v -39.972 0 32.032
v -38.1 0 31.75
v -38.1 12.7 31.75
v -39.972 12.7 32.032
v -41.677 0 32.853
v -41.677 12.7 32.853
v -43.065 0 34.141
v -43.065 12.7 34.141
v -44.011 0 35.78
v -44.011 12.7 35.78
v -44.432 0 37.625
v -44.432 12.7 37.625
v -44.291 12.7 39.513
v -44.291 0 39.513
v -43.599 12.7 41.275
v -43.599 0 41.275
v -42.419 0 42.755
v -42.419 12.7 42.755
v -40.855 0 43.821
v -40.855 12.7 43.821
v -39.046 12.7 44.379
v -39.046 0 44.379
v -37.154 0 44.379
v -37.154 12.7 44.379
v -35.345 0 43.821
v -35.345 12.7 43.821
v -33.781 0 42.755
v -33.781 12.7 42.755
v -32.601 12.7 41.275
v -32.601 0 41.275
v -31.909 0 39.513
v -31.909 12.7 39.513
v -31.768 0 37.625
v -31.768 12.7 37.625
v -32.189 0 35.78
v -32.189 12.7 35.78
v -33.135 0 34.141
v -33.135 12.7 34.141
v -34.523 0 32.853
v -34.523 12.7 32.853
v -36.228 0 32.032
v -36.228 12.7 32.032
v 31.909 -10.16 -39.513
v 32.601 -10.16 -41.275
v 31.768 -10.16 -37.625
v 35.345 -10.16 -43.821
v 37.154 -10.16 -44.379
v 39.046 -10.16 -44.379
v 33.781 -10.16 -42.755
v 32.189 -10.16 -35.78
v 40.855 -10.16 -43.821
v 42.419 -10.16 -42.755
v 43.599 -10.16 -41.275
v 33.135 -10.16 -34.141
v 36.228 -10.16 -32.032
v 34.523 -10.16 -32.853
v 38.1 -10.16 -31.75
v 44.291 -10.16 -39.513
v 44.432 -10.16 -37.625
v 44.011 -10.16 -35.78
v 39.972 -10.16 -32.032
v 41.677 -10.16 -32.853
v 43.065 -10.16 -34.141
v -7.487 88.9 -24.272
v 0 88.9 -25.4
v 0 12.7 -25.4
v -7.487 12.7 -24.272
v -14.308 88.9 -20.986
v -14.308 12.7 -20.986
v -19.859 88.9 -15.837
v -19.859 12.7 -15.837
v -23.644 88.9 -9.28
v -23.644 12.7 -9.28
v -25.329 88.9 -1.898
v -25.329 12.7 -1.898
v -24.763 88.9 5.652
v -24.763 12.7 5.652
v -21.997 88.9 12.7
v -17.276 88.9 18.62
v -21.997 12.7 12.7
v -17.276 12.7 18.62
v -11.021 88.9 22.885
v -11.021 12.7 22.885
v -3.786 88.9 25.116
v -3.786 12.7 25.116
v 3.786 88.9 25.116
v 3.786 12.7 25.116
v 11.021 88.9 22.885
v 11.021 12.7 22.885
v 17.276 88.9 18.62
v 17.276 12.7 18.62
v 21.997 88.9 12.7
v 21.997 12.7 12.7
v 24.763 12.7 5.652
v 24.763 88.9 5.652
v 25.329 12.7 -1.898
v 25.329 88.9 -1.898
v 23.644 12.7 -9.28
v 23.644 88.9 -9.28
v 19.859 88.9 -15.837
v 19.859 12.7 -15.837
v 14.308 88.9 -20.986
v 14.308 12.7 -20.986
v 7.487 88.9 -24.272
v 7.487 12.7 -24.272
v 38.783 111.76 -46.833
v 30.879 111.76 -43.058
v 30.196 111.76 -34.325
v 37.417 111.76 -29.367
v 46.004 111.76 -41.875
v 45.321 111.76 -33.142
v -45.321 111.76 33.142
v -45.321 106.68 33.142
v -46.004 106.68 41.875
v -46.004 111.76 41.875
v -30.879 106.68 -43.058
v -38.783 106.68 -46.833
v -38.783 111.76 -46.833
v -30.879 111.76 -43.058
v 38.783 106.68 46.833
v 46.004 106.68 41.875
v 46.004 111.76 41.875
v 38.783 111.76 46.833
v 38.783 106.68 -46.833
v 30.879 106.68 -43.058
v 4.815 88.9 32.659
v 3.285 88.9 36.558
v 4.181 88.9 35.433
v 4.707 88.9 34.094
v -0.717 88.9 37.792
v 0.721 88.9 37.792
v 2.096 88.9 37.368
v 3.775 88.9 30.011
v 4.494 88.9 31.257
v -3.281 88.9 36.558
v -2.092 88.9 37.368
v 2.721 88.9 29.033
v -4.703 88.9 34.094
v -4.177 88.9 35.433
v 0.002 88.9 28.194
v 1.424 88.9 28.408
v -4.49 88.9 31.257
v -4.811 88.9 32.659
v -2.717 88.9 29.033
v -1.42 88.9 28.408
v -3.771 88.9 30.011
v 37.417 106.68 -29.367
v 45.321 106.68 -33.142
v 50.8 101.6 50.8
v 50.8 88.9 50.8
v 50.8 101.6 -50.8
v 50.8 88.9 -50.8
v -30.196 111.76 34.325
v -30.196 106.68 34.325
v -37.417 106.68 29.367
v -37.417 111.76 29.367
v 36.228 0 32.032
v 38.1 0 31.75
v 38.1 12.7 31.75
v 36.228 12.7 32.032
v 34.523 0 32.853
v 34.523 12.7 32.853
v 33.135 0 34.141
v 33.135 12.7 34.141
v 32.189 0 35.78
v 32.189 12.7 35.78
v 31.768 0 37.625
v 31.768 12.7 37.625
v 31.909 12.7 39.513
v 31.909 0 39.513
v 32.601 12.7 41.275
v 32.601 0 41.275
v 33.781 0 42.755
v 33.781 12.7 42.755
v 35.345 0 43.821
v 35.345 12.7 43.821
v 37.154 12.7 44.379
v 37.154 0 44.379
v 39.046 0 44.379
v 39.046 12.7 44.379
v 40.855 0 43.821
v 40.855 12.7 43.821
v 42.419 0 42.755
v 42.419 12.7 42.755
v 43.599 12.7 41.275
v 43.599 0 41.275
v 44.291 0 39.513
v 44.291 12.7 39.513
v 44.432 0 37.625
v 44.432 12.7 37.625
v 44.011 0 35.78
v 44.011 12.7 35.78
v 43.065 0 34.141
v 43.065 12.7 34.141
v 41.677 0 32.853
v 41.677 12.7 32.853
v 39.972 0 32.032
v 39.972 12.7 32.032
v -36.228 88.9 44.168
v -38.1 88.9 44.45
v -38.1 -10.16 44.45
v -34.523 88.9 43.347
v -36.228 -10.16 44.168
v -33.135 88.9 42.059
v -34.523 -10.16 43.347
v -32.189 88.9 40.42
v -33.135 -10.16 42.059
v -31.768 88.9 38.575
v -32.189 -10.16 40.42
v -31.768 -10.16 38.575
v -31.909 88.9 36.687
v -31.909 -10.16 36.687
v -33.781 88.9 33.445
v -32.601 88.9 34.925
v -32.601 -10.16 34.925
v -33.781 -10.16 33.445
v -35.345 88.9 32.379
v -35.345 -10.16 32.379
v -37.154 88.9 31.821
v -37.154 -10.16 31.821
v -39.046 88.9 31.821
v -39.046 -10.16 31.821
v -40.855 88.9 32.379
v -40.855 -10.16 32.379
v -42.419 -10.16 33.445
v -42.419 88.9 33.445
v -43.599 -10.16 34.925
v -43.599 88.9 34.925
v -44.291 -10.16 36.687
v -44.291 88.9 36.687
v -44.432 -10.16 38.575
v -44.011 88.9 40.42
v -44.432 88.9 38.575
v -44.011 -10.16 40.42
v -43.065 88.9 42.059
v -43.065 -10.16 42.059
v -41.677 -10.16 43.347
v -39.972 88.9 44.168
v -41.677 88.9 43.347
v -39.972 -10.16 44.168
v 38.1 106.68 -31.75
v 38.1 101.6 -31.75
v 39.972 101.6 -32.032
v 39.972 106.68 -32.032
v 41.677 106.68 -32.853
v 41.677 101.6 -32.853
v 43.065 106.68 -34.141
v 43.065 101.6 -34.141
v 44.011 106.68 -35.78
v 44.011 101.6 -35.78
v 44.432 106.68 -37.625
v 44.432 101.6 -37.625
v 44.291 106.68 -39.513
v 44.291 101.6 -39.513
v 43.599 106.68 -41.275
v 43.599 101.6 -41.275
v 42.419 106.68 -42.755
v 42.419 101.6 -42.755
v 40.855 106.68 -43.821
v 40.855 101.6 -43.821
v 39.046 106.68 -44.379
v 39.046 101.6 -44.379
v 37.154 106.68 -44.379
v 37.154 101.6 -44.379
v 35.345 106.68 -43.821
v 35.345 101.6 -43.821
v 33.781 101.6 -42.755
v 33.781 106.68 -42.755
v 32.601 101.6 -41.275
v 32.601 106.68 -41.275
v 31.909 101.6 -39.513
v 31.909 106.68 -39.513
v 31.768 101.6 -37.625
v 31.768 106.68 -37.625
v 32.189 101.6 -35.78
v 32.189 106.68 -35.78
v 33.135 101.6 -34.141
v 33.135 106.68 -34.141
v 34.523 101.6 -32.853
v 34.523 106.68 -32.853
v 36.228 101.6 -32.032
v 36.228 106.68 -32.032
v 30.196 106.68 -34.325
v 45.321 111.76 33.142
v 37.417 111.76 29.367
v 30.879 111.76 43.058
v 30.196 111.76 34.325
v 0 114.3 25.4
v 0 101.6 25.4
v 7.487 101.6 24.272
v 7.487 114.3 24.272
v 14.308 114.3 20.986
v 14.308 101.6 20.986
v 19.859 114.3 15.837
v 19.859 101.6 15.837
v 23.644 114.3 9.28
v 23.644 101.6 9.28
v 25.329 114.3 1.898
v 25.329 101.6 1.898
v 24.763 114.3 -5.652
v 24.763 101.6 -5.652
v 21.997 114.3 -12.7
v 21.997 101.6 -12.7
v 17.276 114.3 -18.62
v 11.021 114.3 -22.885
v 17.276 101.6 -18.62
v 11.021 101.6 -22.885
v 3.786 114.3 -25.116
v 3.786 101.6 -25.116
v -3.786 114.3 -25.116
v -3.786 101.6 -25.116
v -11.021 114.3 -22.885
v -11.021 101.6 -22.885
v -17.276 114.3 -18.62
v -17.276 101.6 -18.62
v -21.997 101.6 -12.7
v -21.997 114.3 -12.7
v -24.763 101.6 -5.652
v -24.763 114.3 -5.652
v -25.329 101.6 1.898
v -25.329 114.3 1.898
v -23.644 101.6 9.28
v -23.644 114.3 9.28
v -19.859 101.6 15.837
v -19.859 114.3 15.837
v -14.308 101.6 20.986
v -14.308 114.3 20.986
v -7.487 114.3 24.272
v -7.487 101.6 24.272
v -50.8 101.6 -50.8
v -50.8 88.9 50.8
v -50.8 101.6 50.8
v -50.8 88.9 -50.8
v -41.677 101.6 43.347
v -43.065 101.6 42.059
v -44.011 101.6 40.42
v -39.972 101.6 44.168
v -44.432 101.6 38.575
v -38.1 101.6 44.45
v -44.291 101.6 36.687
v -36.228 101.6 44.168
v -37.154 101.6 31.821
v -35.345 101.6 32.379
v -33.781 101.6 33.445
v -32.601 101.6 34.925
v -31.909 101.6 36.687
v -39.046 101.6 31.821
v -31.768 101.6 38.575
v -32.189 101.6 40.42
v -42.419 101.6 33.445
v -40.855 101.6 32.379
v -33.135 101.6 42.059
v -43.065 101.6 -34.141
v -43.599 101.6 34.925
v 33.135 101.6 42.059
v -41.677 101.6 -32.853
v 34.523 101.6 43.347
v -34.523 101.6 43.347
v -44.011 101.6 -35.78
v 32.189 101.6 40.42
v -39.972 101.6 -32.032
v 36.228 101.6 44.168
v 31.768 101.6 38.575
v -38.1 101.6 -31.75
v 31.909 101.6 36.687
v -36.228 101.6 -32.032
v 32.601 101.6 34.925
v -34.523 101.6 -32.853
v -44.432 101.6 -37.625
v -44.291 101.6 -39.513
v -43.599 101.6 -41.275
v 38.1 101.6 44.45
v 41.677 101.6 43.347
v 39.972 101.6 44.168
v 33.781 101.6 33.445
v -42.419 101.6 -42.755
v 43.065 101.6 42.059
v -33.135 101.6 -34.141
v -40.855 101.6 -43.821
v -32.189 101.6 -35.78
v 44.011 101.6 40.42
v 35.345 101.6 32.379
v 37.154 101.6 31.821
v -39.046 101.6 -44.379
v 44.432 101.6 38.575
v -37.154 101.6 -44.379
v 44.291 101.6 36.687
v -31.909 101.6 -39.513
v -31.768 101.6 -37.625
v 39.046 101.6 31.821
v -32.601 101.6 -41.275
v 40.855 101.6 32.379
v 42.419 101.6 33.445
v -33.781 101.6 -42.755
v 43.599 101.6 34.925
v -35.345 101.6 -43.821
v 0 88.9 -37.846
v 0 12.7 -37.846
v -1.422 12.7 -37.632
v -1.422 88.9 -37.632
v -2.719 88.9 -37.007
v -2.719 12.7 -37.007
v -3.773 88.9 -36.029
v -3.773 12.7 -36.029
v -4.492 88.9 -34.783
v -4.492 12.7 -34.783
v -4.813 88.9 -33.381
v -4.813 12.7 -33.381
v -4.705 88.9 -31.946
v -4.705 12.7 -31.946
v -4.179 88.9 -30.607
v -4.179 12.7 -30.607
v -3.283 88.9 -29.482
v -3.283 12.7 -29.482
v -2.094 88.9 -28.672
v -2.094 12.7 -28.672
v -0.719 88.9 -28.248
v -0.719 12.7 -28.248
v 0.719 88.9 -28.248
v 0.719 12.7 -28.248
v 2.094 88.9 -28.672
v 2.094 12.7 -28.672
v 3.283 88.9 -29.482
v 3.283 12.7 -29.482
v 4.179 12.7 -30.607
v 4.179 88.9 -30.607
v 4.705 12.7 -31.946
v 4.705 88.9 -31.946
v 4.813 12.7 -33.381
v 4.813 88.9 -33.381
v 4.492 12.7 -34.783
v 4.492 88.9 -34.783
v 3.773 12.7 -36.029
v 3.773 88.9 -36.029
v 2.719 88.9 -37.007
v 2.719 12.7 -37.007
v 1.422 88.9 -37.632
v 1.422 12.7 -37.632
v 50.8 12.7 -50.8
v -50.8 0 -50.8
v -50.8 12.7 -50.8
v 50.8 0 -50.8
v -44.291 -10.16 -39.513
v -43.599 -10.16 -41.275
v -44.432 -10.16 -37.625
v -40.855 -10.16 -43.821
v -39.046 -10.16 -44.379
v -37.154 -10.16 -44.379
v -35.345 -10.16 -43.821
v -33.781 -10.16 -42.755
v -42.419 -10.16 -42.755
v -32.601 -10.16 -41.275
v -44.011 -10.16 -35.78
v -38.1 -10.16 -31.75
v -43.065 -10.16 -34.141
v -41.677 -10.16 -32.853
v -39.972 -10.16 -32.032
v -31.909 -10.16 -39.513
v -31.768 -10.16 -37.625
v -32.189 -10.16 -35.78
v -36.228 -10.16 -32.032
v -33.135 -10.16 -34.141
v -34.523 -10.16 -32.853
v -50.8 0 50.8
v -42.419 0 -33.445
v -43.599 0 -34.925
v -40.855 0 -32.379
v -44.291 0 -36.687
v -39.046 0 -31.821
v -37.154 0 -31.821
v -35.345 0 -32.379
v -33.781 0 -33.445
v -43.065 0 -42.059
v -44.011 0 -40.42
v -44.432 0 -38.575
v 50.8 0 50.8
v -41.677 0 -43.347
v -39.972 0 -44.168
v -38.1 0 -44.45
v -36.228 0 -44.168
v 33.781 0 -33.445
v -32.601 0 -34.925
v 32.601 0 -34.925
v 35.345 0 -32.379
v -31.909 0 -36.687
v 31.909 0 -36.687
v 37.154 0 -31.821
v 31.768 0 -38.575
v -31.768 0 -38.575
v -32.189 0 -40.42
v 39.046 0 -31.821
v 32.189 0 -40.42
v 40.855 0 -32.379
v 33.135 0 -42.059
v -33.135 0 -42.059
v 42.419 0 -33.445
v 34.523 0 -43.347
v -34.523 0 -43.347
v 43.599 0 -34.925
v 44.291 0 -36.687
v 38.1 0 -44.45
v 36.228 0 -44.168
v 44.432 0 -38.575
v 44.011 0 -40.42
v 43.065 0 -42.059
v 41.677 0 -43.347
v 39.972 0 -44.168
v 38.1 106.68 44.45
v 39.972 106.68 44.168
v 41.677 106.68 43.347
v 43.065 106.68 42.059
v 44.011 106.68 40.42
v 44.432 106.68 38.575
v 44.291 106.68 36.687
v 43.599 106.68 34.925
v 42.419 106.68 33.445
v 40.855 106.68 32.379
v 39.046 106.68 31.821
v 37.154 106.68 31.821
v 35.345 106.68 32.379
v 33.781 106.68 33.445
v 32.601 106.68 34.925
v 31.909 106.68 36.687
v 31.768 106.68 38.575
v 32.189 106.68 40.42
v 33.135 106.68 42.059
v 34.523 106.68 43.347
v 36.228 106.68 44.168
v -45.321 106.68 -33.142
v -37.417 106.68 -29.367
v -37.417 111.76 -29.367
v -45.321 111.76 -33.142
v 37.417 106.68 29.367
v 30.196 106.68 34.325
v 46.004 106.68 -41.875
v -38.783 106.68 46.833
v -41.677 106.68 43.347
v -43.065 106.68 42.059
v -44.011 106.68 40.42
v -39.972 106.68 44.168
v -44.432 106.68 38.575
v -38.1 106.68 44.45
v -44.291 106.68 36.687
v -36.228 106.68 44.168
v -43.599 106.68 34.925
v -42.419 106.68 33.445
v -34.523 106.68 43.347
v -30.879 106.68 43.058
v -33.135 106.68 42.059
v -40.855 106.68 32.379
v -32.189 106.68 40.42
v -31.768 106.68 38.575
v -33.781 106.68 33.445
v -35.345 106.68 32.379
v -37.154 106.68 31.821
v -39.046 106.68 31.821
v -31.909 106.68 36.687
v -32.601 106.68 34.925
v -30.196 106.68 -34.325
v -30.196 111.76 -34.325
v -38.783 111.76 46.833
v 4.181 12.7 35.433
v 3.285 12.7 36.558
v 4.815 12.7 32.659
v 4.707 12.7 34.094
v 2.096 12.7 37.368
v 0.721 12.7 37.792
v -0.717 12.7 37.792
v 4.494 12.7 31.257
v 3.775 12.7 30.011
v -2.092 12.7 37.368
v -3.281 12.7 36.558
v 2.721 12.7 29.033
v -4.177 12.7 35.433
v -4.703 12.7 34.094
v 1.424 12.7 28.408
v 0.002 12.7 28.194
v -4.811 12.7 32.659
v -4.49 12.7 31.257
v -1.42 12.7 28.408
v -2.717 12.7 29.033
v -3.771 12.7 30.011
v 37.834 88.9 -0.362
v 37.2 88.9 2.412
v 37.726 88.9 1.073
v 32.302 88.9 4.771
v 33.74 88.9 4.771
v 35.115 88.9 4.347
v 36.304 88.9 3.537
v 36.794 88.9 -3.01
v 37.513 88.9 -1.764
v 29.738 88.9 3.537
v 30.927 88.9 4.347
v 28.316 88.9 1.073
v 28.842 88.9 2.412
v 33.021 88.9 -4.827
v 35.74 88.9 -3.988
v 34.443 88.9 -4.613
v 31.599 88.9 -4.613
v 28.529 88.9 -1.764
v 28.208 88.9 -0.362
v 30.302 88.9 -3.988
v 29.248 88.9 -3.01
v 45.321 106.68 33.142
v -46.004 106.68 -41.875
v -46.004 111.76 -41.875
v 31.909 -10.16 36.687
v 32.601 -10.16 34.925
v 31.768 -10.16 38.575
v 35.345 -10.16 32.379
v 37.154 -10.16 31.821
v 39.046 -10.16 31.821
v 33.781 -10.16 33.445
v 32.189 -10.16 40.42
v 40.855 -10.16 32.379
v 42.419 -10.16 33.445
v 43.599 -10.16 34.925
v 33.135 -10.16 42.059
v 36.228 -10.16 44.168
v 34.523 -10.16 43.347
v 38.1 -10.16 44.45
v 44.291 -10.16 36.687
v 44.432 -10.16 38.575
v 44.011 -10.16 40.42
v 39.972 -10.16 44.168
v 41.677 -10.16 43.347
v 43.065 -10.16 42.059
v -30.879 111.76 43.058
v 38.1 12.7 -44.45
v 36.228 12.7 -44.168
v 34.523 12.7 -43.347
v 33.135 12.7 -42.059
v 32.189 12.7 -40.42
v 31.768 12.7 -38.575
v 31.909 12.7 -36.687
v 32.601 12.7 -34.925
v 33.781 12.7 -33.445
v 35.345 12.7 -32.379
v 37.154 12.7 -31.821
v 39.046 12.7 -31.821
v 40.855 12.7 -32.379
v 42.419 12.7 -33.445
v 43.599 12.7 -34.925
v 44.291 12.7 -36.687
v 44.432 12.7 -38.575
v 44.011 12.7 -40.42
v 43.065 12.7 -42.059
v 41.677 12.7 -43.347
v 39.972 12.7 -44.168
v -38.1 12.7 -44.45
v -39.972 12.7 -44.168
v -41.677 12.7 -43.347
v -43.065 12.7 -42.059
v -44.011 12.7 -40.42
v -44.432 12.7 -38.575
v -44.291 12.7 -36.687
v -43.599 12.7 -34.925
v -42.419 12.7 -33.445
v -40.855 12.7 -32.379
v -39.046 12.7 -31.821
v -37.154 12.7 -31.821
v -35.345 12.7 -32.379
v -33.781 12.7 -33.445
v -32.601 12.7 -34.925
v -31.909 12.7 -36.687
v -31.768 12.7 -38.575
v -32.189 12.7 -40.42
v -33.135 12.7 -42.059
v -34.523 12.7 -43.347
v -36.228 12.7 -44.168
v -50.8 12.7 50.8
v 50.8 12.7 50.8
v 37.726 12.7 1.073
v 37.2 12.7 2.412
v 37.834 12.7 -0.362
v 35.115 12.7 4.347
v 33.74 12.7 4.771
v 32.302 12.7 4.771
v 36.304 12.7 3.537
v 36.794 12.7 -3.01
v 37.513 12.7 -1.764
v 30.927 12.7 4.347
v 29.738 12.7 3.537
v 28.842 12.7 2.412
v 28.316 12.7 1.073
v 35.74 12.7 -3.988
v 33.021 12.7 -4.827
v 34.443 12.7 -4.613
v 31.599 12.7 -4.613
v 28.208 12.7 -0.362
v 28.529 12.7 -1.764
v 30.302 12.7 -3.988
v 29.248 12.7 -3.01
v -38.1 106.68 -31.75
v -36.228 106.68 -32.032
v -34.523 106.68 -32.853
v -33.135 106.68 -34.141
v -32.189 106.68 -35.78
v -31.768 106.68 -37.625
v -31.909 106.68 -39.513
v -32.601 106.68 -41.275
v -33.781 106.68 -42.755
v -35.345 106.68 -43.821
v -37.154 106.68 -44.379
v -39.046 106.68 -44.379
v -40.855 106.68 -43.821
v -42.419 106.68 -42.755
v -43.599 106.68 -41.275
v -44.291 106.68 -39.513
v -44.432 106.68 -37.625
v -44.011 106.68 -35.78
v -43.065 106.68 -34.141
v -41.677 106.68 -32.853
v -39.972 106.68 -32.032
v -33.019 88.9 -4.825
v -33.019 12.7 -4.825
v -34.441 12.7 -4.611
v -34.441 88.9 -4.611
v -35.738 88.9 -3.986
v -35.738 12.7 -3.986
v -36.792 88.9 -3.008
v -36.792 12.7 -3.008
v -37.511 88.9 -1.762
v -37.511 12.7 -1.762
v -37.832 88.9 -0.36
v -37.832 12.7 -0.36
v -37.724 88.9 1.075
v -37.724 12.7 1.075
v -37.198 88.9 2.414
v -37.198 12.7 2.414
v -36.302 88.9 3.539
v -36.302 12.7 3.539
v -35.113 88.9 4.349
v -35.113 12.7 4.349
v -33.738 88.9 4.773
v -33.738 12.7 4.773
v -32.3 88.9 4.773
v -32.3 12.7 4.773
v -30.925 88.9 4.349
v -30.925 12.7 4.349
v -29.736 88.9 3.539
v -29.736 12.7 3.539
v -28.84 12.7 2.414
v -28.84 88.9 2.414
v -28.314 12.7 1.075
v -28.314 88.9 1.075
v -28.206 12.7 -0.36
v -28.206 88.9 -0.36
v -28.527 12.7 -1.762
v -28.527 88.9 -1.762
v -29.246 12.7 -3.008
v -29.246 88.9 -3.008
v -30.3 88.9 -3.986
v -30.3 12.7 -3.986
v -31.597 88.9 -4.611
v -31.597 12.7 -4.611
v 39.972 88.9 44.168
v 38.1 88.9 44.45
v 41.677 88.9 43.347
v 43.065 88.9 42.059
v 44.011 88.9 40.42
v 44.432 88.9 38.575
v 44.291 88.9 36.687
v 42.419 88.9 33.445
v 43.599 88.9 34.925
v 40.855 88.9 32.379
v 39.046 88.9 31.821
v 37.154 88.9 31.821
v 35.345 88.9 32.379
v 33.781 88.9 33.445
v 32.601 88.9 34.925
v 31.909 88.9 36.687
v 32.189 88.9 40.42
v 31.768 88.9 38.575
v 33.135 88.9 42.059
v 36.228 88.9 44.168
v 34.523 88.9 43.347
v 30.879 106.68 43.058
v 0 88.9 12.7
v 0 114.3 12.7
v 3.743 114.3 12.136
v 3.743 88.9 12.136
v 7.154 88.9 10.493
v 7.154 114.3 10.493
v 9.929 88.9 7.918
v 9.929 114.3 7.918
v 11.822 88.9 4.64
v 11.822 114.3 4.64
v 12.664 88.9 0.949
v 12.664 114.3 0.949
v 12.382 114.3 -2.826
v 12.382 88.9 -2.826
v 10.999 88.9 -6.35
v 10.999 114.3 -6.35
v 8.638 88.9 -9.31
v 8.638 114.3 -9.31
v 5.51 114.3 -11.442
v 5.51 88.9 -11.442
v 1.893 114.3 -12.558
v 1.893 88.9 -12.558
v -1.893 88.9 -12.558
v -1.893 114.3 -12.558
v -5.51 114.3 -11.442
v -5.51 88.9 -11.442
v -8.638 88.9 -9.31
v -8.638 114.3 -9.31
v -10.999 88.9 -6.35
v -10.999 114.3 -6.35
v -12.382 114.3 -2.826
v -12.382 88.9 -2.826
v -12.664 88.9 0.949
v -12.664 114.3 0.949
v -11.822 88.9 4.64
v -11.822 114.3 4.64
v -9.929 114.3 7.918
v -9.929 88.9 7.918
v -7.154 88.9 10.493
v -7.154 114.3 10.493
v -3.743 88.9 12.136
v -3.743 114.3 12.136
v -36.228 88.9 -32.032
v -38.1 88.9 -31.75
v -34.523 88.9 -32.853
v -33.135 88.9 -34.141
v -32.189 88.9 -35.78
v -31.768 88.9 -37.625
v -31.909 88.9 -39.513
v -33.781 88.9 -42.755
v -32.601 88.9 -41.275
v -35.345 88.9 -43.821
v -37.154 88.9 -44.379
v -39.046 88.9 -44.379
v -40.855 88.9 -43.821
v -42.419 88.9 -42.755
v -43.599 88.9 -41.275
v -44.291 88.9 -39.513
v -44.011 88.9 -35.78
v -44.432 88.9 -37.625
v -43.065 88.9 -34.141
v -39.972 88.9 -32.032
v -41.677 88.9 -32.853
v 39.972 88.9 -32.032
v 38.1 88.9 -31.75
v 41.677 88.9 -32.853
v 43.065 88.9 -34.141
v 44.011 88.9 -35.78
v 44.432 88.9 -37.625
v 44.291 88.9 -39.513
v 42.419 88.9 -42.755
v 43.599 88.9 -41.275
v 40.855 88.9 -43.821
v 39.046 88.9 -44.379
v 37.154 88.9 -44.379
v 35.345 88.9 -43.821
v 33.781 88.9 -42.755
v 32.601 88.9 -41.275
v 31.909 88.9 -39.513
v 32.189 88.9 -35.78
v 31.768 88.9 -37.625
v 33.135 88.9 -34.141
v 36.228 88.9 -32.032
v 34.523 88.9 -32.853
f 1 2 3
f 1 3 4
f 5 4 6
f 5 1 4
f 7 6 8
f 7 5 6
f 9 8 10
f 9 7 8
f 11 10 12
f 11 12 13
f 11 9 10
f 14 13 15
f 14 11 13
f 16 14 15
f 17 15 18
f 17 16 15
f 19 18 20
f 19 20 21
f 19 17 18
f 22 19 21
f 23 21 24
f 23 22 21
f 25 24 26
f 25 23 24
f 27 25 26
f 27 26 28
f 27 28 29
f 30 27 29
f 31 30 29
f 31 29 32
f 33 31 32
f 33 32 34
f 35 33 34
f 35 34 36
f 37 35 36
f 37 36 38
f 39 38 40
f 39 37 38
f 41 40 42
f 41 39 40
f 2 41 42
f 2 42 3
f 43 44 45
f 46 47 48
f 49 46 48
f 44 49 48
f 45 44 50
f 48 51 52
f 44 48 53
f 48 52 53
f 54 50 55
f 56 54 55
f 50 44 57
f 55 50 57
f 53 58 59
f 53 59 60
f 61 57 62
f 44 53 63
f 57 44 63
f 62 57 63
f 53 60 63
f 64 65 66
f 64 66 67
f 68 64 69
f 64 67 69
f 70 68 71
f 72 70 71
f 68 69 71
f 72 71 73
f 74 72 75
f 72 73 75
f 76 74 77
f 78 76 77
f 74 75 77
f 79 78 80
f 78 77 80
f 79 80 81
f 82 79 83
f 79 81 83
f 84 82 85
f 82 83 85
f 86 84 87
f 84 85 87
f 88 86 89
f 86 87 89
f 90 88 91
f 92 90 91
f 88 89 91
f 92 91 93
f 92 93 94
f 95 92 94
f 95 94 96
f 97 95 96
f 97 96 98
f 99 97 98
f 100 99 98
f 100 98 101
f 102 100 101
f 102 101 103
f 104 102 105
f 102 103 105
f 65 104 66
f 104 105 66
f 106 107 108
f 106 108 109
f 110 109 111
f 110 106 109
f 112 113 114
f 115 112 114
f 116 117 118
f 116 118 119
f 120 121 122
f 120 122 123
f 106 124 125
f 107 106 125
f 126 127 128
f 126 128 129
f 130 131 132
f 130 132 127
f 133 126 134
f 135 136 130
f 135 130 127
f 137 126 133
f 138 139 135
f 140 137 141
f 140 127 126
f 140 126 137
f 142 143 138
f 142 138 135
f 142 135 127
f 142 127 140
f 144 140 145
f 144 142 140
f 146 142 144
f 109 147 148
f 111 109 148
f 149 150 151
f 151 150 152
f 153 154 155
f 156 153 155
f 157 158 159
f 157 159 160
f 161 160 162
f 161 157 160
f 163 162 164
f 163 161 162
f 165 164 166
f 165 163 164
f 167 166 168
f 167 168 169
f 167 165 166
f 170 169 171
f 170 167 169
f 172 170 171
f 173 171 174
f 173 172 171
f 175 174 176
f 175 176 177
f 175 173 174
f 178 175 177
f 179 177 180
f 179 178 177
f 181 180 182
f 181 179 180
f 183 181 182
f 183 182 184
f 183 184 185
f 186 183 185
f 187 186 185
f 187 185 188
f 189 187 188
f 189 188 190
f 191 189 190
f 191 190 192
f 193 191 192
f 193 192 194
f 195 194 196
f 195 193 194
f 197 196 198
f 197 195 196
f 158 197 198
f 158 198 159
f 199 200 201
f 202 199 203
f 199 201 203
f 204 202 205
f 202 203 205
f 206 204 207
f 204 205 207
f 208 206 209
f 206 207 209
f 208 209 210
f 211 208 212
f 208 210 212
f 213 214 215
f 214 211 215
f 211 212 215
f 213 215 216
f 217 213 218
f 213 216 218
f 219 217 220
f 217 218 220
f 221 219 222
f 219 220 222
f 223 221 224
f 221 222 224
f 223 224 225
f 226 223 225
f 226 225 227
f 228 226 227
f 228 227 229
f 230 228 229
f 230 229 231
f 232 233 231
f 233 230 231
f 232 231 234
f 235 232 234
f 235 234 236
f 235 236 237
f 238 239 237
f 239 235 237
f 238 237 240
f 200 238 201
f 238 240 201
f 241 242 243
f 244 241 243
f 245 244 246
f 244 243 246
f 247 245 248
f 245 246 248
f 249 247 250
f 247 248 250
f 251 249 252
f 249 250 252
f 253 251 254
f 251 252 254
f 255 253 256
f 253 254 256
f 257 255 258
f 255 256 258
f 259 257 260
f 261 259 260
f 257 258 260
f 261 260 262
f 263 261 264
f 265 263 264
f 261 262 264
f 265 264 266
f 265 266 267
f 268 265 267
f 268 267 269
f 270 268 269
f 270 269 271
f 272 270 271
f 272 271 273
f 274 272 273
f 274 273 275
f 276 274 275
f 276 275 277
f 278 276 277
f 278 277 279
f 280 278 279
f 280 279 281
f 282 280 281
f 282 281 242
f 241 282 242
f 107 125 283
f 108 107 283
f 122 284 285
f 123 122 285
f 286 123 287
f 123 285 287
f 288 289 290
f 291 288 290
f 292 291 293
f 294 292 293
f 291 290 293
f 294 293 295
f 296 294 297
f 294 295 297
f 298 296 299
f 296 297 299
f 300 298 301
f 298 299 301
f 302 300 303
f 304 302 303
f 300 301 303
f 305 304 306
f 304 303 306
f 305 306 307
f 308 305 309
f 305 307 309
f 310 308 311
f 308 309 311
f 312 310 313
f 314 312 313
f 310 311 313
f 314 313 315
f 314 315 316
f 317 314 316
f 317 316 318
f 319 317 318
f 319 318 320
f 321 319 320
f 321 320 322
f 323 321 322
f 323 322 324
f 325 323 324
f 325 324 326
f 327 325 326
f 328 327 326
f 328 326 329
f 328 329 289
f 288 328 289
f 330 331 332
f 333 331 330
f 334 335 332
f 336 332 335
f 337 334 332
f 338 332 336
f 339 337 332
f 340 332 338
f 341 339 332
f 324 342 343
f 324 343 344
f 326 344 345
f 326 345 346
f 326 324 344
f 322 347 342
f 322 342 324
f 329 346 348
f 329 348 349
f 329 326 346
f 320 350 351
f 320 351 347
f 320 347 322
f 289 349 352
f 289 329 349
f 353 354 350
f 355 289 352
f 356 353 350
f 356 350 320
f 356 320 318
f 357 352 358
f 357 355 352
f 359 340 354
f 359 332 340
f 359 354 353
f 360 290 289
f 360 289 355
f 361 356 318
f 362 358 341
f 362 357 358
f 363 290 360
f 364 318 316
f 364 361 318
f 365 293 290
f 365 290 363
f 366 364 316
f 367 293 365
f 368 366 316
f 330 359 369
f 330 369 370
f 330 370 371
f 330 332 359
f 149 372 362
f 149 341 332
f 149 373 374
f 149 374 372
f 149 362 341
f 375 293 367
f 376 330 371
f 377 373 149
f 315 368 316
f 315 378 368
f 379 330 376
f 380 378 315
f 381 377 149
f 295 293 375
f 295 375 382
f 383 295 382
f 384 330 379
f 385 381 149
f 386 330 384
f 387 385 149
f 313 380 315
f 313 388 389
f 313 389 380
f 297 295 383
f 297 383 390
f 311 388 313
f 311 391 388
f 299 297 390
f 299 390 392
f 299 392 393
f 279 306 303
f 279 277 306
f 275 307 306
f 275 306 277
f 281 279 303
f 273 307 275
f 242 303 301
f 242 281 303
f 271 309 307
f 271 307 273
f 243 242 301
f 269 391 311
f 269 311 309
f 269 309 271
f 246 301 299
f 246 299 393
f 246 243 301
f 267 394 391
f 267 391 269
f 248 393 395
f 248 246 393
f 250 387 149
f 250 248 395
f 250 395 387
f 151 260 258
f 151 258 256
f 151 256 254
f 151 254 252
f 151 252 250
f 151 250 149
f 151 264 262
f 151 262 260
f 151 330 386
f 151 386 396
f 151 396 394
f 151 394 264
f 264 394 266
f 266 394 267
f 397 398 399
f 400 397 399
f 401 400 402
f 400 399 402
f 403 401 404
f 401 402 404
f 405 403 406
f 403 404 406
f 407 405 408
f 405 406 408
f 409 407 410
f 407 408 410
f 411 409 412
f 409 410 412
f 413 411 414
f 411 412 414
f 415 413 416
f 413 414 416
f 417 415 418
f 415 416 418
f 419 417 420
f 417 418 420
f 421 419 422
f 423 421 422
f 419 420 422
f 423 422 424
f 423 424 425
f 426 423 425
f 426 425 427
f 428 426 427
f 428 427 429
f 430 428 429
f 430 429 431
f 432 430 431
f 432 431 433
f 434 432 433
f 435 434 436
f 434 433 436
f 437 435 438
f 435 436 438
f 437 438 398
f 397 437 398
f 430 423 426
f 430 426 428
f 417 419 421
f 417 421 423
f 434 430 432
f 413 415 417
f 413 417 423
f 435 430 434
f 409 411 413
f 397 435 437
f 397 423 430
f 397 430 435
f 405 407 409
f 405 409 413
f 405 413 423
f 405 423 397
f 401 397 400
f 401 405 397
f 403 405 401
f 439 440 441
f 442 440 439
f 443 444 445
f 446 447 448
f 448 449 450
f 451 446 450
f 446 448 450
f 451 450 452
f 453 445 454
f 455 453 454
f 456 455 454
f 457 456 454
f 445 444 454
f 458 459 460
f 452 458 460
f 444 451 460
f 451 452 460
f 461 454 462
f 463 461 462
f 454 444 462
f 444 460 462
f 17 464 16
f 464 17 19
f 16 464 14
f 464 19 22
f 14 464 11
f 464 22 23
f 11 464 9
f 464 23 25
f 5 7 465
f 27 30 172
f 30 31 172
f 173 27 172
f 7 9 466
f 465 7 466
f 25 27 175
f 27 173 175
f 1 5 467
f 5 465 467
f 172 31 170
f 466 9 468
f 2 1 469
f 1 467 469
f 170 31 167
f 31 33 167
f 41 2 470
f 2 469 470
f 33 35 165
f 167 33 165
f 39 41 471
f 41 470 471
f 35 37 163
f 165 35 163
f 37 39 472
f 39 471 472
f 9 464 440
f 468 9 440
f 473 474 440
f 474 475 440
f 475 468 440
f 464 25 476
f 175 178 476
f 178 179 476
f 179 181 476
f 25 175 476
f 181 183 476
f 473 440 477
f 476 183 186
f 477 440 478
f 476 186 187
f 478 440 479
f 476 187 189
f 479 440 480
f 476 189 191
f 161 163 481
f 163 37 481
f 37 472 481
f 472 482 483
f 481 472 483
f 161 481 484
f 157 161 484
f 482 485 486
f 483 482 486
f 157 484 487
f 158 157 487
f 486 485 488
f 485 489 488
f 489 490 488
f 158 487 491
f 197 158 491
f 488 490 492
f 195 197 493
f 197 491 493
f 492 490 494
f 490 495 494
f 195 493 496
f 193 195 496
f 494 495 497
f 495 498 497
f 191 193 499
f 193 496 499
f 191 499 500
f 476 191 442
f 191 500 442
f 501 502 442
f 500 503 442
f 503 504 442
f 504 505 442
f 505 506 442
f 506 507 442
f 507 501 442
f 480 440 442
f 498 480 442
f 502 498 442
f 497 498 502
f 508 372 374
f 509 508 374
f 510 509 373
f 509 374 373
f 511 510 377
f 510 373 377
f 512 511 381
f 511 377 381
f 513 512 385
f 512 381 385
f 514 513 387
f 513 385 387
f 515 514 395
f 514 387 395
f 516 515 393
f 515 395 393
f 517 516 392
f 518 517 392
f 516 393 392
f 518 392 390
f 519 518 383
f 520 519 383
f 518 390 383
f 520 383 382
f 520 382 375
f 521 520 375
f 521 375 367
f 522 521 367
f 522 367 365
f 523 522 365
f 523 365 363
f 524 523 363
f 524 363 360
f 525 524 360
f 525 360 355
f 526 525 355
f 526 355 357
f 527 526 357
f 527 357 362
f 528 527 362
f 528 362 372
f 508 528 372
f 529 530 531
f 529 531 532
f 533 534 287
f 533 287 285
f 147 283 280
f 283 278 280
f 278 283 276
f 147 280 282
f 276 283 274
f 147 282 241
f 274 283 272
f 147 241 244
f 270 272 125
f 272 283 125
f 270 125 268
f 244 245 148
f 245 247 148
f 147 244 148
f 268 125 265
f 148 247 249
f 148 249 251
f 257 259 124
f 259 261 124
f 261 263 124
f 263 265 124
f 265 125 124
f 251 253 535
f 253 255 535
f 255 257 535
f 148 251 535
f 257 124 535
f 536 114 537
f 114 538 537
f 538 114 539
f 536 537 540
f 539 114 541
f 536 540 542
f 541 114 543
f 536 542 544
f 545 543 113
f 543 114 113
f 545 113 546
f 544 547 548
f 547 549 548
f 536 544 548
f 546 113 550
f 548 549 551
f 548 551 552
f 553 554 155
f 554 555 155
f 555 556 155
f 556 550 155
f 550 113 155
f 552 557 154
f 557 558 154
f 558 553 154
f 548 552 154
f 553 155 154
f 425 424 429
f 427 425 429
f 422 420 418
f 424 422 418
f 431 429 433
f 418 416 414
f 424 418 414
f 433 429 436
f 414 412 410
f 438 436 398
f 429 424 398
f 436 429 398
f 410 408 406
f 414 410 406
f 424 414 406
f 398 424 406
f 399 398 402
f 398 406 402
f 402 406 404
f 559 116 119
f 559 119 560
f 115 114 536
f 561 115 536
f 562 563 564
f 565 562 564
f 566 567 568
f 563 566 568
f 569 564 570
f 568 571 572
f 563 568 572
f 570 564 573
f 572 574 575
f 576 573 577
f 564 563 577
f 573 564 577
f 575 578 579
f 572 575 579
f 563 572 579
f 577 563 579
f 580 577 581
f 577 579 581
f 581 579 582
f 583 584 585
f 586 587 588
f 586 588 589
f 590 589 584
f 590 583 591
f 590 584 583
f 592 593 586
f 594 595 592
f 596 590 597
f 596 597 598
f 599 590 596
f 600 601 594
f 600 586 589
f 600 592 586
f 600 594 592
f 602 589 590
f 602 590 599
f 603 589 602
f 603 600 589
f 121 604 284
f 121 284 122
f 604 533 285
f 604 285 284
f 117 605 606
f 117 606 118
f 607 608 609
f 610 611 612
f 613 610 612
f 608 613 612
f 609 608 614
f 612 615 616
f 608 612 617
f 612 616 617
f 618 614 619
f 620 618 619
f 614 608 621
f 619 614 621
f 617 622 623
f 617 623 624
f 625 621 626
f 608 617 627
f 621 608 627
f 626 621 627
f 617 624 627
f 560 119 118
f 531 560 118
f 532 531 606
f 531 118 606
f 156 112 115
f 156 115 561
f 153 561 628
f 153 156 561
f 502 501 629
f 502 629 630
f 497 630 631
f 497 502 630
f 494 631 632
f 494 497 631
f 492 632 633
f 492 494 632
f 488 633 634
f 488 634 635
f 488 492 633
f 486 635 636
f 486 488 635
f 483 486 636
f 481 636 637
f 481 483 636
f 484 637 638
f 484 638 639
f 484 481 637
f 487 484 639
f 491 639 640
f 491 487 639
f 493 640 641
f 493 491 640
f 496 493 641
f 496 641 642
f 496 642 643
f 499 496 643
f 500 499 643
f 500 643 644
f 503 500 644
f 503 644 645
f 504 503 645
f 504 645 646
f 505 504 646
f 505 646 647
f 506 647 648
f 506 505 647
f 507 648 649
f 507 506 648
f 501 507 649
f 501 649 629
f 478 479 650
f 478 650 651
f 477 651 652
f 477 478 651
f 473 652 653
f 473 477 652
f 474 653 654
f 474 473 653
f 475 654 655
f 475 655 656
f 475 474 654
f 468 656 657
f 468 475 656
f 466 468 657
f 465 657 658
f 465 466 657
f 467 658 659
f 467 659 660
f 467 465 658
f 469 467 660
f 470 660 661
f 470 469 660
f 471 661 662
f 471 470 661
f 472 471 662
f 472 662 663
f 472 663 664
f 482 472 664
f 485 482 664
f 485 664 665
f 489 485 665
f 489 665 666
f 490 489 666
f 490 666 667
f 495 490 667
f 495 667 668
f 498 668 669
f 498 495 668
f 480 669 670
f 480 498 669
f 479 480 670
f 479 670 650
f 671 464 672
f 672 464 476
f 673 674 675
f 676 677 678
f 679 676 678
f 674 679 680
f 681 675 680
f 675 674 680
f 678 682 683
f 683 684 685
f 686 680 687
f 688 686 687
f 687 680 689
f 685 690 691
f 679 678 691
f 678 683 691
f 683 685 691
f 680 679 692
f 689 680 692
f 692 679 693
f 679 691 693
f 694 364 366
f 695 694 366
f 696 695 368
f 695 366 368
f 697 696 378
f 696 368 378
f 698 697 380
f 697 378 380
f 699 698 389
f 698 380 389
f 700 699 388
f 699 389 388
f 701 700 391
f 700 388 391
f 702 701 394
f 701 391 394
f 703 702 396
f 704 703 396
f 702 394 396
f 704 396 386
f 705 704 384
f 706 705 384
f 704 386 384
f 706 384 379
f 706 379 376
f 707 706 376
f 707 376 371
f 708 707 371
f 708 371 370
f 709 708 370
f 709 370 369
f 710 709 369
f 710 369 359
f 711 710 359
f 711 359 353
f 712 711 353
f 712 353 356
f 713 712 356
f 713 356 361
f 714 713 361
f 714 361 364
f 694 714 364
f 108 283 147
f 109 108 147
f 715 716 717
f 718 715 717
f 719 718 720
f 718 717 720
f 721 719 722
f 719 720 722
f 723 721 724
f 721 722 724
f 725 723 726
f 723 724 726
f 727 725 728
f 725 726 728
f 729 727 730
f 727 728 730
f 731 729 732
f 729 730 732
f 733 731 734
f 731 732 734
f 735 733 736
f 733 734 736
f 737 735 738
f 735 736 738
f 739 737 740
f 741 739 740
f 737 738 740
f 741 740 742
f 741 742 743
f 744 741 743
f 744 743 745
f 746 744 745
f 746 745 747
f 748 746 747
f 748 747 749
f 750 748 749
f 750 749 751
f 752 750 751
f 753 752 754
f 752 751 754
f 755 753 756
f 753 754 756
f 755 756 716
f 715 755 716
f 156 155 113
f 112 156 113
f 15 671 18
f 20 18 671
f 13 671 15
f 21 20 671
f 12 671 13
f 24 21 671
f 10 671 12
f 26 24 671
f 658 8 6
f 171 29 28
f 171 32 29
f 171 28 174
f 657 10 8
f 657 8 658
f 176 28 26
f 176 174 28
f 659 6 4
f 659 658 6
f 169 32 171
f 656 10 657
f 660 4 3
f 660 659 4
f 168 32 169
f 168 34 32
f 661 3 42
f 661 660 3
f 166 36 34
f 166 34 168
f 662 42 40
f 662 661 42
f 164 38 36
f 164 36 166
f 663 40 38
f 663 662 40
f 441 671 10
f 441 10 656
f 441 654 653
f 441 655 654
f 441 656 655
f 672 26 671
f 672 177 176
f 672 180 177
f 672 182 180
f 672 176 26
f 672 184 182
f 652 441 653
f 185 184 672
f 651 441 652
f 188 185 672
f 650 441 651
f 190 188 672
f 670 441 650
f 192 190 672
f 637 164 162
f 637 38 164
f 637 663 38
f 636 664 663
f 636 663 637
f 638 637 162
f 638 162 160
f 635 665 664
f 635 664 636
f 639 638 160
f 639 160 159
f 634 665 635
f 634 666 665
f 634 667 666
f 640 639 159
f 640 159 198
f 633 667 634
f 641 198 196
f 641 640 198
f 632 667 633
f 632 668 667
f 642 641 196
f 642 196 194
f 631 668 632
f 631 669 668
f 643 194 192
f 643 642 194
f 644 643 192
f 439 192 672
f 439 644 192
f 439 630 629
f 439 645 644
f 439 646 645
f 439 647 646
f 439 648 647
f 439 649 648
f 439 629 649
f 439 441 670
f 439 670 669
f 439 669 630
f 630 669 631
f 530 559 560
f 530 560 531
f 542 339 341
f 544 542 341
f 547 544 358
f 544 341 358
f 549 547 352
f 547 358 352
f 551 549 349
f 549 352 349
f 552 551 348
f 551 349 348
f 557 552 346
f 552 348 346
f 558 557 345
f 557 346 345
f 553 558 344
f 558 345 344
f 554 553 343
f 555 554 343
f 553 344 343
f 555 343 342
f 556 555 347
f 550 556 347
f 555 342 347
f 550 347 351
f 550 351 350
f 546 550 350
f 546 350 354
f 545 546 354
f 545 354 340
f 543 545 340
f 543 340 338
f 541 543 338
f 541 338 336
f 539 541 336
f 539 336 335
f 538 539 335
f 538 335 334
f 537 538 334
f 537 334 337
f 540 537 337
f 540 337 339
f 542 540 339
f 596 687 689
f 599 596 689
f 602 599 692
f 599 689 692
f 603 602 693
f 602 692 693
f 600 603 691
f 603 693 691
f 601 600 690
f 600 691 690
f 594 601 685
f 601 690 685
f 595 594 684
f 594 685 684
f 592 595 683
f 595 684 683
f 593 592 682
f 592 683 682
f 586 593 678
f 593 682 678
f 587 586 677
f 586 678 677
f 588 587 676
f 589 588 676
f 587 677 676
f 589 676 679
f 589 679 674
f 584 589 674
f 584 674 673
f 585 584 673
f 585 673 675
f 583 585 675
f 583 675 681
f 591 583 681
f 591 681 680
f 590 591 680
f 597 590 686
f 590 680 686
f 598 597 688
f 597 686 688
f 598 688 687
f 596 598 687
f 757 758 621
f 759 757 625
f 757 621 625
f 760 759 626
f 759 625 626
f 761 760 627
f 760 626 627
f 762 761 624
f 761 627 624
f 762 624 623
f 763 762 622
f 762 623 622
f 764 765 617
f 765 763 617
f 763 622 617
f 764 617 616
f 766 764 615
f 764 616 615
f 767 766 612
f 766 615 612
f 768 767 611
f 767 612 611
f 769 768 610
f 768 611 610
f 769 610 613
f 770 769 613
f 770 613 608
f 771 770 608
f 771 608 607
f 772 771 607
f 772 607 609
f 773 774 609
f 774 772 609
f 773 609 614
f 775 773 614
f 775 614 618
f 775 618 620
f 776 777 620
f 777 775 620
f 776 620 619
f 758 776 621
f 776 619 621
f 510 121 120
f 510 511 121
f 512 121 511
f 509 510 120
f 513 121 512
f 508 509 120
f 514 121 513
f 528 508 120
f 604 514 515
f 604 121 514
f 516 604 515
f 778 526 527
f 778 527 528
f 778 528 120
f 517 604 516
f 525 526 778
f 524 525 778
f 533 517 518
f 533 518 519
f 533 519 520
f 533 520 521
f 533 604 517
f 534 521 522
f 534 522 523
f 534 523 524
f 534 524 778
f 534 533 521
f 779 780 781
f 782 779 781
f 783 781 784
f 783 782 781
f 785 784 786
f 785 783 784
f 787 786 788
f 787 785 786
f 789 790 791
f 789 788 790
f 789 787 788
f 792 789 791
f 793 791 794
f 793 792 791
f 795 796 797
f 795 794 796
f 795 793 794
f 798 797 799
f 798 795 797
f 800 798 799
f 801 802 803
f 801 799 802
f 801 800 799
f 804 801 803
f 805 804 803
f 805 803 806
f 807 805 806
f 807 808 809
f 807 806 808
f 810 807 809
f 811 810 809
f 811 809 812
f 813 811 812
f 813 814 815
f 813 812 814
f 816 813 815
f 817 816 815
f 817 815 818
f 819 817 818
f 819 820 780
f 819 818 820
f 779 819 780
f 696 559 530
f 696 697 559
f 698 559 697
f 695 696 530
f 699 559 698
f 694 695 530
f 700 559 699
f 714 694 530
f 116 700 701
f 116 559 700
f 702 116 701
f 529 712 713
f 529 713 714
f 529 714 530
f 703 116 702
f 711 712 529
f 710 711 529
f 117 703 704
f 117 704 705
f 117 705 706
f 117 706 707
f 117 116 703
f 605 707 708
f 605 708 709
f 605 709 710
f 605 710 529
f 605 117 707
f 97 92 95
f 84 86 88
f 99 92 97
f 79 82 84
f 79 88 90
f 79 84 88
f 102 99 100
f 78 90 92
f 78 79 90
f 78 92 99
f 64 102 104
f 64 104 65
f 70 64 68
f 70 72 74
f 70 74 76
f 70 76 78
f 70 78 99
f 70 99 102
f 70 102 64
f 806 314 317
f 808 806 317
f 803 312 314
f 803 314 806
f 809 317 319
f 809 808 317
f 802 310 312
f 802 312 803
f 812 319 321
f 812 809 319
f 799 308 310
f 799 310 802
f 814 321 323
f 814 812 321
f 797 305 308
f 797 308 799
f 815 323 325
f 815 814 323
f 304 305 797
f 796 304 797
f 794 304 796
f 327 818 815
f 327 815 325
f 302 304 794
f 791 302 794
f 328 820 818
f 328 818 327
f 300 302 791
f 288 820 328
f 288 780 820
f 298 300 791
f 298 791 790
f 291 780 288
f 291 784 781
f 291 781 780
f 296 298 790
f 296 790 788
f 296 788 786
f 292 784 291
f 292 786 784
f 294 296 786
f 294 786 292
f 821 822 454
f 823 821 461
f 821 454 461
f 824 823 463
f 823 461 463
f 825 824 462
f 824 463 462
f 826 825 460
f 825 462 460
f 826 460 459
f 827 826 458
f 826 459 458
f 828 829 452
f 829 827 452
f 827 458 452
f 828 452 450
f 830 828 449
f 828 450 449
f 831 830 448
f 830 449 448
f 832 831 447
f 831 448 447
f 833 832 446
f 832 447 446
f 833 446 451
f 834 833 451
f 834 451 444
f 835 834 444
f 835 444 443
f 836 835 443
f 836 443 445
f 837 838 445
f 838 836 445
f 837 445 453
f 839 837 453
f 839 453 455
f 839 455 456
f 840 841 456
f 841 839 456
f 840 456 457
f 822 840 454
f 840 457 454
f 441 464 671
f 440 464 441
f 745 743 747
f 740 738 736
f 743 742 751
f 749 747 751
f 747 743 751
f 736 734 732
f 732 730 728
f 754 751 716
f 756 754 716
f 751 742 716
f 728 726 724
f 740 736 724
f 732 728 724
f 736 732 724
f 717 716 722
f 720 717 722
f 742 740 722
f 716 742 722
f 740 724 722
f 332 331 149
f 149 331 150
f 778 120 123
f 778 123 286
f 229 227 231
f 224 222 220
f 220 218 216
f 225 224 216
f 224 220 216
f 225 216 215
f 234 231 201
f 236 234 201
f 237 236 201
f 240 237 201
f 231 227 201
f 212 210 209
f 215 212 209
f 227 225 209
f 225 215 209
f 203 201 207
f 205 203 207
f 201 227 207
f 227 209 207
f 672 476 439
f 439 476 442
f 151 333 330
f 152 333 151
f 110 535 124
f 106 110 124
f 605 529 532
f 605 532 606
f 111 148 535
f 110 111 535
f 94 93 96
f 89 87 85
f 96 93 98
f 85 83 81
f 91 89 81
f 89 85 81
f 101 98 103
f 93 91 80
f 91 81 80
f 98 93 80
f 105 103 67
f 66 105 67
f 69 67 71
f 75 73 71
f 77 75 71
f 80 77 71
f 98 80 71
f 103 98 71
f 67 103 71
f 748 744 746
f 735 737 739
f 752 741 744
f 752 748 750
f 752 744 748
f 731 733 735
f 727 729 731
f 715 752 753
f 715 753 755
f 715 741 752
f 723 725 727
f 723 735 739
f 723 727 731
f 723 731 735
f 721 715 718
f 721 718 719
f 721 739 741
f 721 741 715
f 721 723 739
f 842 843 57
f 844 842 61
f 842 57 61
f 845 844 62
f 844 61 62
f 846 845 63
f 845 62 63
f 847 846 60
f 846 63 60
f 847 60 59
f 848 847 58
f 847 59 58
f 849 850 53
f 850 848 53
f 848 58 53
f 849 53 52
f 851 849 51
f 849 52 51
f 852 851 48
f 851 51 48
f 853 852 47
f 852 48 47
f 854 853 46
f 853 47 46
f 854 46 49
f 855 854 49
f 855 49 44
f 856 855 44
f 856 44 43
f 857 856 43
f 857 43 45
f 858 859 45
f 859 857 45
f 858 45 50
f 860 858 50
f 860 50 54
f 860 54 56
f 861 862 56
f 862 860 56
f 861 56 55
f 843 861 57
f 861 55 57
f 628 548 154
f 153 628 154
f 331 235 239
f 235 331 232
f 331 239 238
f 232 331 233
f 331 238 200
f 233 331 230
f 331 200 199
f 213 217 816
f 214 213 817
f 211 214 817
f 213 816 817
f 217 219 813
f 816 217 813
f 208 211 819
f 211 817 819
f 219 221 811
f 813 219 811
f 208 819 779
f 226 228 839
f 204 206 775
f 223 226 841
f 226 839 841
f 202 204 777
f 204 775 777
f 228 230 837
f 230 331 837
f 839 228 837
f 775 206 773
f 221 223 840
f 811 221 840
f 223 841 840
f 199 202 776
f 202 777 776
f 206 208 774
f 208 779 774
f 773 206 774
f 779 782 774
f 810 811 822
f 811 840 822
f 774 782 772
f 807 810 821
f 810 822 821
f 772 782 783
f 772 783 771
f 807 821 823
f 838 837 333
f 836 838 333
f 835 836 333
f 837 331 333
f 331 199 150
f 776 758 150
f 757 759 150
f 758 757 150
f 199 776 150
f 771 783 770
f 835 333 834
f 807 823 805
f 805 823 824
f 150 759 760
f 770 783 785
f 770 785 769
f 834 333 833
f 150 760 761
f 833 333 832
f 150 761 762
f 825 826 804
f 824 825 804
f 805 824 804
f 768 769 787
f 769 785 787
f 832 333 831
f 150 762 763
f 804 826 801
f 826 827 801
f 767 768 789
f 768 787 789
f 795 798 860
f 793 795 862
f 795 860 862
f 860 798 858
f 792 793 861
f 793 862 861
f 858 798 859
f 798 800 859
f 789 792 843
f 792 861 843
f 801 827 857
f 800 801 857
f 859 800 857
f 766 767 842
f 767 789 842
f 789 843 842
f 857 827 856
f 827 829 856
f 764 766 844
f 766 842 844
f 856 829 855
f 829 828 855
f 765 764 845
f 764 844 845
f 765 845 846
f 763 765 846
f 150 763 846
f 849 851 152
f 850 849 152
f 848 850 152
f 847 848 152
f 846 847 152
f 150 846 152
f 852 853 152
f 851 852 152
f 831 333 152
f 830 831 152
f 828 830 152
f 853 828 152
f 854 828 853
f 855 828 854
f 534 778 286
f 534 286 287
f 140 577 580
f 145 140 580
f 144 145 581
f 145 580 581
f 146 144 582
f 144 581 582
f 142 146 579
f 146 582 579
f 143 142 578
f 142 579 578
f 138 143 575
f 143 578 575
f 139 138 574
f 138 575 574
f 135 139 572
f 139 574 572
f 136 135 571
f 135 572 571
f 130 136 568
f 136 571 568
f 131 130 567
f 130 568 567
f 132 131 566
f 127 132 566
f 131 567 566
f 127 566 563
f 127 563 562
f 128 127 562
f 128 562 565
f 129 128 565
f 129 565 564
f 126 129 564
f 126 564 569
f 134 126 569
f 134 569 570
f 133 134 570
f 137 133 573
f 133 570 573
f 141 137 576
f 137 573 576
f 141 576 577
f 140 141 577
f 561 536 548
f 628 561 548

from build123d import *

# Parameters (mm, degrees)
SKETCH1_W                  = 101.6
SKETCH1_H                  = 101.6
SKETCH1_R                  = 6.35
BOSS_EXTRUDE1_DEPTH        = 12.7
SKETCH2_R                  = 25.4
BOSS_EXTRUDE2_DEPTH        = 76.2
SKETCH2_R_2                = 4.826
BOSS_EXTRUDE2_2_DEPTH      = 76.2
BOSS_EXTRUDE2_3_DEPTH      = 76.2
BOSS_EXTRUDE2_4_DEPTH      = 76.2
BOSS_EXTRUDE2_5_DEPTH      = 76.2
SKETCH4_W                  = 101.6
SKETCH4_H                  = 101.6
SKETCH4_R                  = 25.4
BOSS_EXTRUDE4_DEPTH        = 12.7
CUT_EXTRUDE2_DEPTH         = 115.3
CUT_EXTRUDE2_DEPTH_BACK    = 115.3
SKETCH5_R                  = 6.35
SKETCH6_R                  = 25.4
BOSS_EXTRUDE5_DEPTH        = 25.4
CUT_EXTRUDE3_DEPTH         = 136.002851822
CUT_EXTRUDE3_DEPTH_BACK    = 136.002851822
SKETCH7_R                  = 12.7
BOSS_EXTRUDE6_DEPTH        = 15.24
BOSS_EXTRUDE6_DEPTH_BACK   = 101.6
SKETCH9_R                  = 6.35
BOSS_EXTRUDE6_2_DEPTH      = 15.24
BOSS_EXTRUDE6_2_DEPTH_BACK = 101.6
BOSS_EXTRUDE6_3_DEPTH      = 15.24
BOSS_EXTRUDE6_3_DEPTH_BACK = 101.6
BOSS_EXTRUDE6_4_DEPTH      = 15.24
BOSS_EXTRUDE6_4_DEPTH_BACK = 101.6
BOSS_EXTRUDE7_DEPTH        = 5.08


with BuildPart() as part:
    # Sketch1 → Boss-Extrude1 (new body)
    with BuildSketch(Plane(origin=(0, 0, 0), x_dir=(1, 0, 0), z_dir=(0, 1, 0))):
        Rectangle(SKETCH1_W, SKETCH1_H)
        with Locations(Location((-38.1, 38.1, 0), (0, 0, 90))):
            Circle(SKETCH1_R, mode=Mode.SUBTRACT)
        with Locations(Location((38.1, 38.1, 0), (0, 0, 90))):
            Circle(SKETCH1_R, mode=Mode.SUBTRACT)
        with Locations(Location((38.1, -38.1, 0), (0, 0, 90))):
            Circle(SKETCH1_R, mode=Mode.SUBTRACT)
        with Locations(Location((-38.1, -38.1, 0), (0, 0, 90))):
            Circle(SKETCH1_R, mode=Mode.SUBTRACT)
    extrude(amount=BOSS_EXTRUDE1_DEPTH)


with BuildPart() as body_2:
    # Sketch2 → Boss-Extrude2 (new body)
    with BuildSketch(Plane(origin=(0, 12.7, 0), x_dir=(1, 0, 0), z_dir=(0, 1, 0))):
        with Locations(Location((0, 0, 0), (0, 0, 90))):
            Circle(SKETCH2_R)
    extrude(amount=BOSS_EXTRUDE2_DEPTH)


with BuildPart() as body_3:
    # Sketch2 → Boss-Extrude2 2 (new body)
    with BuildSketch(Plane(origin=(0, 12.7, 0), x_dir=(1, 0, 0), z_dir=(0, 1, 0))):
        with Locations(Location((0, 33.02, 0), (0, 0, 90))):
            Circle(SKETCH2_R_2)
    extrude(amount=BOSS_EXTRUDE2_2_DEPTH)


with BuildPart() as body_4:
    # Sketch2 → Boss-Extrude2 3 (new body)
    with BuildSketch(Plane(origin=(0, 12.7, 0), x_dir=(1, 0, 0), z_dir=(0, 1, 0))):
        with Locations(Location((33.021, 0.001, 0), (0, 0, 90))):
            Circle(SKETCH2_R_2)
    extrude(amount=BOSS_EXTRUDE2_3_DEPTH)


with BuildPart() as body_5:
    # Sketch2 → Boss-Extrude2 4 (new body)
    with BuildSketch(Plane(origin=(0, 12.7, 0), x_dir=(1, 0, 0), z_dir=(0, 1, 0))):
        with Locations(Location((0.002, -33.02, 0), (0, 0, 90))):
            Circle(SKETCH2_R_2)
    extrude(amount=BOSS_EXTRUDE2_4_DEPTH)


with BuildPart() as body_6:
    # Sketch2 → Boss-Extrude2 5 (new body)
    with BuildSketch(Plane(origin=(0, 12.7, 0), x_dir=(1, 0, 0), z_dir=(0, 1, 0))):
        with Locations(Location((-33.019, -0.001, 0), (0, 0, 90))):
            Circle(SKETCH2_R_2)
    extrude(amount=BOSS_EXTRUDE2_5_DEPTH)


with BuildPart() as body_7:
    # Sketch4 → Boss-Extrude4 (new body)
    with BuildSketch(Plane(origin=(0, 88.9, 0), x_dir=(1, 0, 0), z_dir=(0, 1, 0))):
        Rectangle(SKETCH4_W, SKETCH4_H)
        with Locations(Location((0, 0, 0), (0, 0, 270))):
            Circle(SKETCH4_R, mode=Mode.SUBTRACT)
    extrude(amount=BOSS_EXTRUDE4_DEPTH)

    # Sketch5 → Cut-Extrude2 (cut, two sides: drawn at the far end of the back side and taken through both)
    with BuildSketch(Plane(origin=(0, 88.9, 0), x_dir=(1, 0, 0), z_dir=(0, 1, 0)).offset(-CUT_EXTRUDE2_DEPTH_BACK)):
        with Locations(Location((-38.1, 38.1, 0), (0, 0, 270))):
            Circle(SKETCH5_R)
        with Locations(Location((38.1, -38.1, 0), (0, 0, 270))):
            Circle(SKETCH5_R)
        with Locations(Location((-38.1, -38.1, 0), (0, 0, 270))):
            Circle(SKETCH5_R)
        with Locations(Location((38.1, 38.1, 0), (0, 0, 270))):
            Circle(SKETCH5_R)
    extrude(amount=CUT_EXTRUDE2_DEPTH + CUT_EXTRUDE2_DEPTH_BACK, mode=Mode.SUBTRACT)

    # Sketch6 → Boss-Extrude5 (add)
    with BuildSketch(Plane(origin=(0, 88.9, 0), x_dir=(1, 0, 0), z_dir=(0, 1, 0))):
        with Locations(Location((0, 0, 0), (0, 0, 270))):
            Circle(SKETCH6_R)
    extrude(amount=BOSS_EXTRUDE5_DEPTH)

    # Sketch7 → Cut-Extrude3 (cut, two sides: drawn at the far end of the back side and taken through both)
    with BuildSketch(Plane(origin=(0, 114.3, 0), x_dir=(1, 0, 0), z_dir=(0, 1, 0)).offset(-CUT_EXTRUDE3_DEPTH_BACK)):
        with Locations(Location((0, 0, 0), (0, 0, 270))):
            Circle(SKETCH7_R)
    extrude(amount=CUT_EXTRUDE3_DEPTH + CUT_EXTRUDE3_DEPTH_BACK, mode=Mode.SUBTRACT)



with BuildPart() as body_8:
    # Sketch9 → Boss-Extrude6 (new, two sides: drawn at the far end of the back side and taken through both)
    with BuildSketch(Plane(origin=(0, 91.44, 0), x_dir=(1, 0, 0), z_dir=(0, 1, 0)).offset(-BOSS_EXTRUDE6_DEPTH_BACK)):
        with Locations(Location((-38.1, -38.1, 0), (0, 0, 270))):
            Circle(SKETCH9_R)
    extrude(amount=BOSS_EXTRUDE6_DEPTH + BOSS_EXTRUDE6_DEPTH_BACK)


with BuildPart() as body_9:
    # Sketch9 → Boss-Extrude6 2 (new, two sides: drawn at the far end of the back side and taken through both)
    with BuildSketch(Plane(origin=(0, 91.44, 0), x_dir=(1, 0, 0), z_dir=(0, 1, 0)).offset(-BOSS_EXTRUDE6_2_DEPTH_BACK)):
        with Locations(Location((38.1, -38.1, 0), (0, 0, 270))):
            Circle(SKETCH9_R)
    extrude(amount=BOSS_EXTRUDE6_2_DEPTH + BOSS_EXTRUDE6_2_DEPTH_BACK)


with BuildPart() as body_10:
    # Sketch9 → Boss-Extrude6 3 (new, two sides: drawn at the far end of the back side and taken through both)
    with BuildSketch(Plane(origin=(0, 91.44, 0), x_dir=(1, 0, 0), z_dir=(0, 1, 0)).offset(-BOSS_EXTRUDE6_3_DEPTH_BACK)):
        with Locations(Location((38.1, 38.1, 0), (0, 0, 270))):
            Circle(SKETCH9_R)
    extrude(amount=BOSS_EXTRUDE6_3_DEPTH + BOSS_EXTRUDE6_3_DEPTH_BACK)


with BuildPart() as body_11:
    # Sketch9 → Boss-Extrude6 4 (new, two sides: drawn at the far end of the back side and taken through both)
    with BuildSketch(Plane(origin=(0, 91.44, 0), x_dir=(1, 0, 0), z_dir=(0, 1, 0)).offset(-BOSS_EXTRUDE6_4_DEPTH_BACK)):
        with Locations(Location((-38.1, 38.1, 0), (0, 0, 270))):
            Circle(SKETCH9_R)
    extrude(amount=BOSS_EXTRUDE6_4_DEPTH + BOSS_EXTRUDE6_4_DEPTH_BACK)


with BuildPart() as body_7_1:
    add(body_7.part)

    add(body_8.part)  # Boss-Extrude7 merges body 8

    add(body_9.part)  # Boss-Extrude7 merges body 9

    add(body_10.part)  # Boss-Extrude7 merges body 10

    add(body_11.part)  # Boss-Extrude7 merges body 11
    # Sketch10 → Boss-Extrude7 (add)
    with BuildSketch(Plane(origin=(0, 106.68, 0), x_dir=(1, 0, 0), z_dir=(0, 1, 0))):
        Polygon((-30.878983534, -43.057961512), (-30.195771147, -34.325397056), (-37.416787612, -29.367435544), (-45.321016466, -33.142038488), (-46.004228853, -41.874602944), (-38.783212388, -46.832564456), align=None)
        Polygon((-38.783212388, 46.832564456), (-30.878983534, 43.057961512), (-30.195771147, 34.325397056), (-37.416787612, 29.367435544), (-45.321016466, 33.142038488), (-46.004228853, 41.874602944), align=None)
        Polygon((46.004228853, 41.874602944), (38.783212388, 46.832564456), (30.878983534, 43.057961512), (30.195771147, 34.325397056), (37.416787612, 29.367435544), (45.321016466, 33.142038488), align=None)
        Polygon((38.783212388, -46.832564456), (30.878983534, -43.057961512), (30.195771147, -34.325397056), (37.416787612, -29.367435544), (45.321016466, -33.142038488), (46.004228853, -41.874602944), align=None)
    extrude(amount=BOSS_EXTRUDE7_DEPTH)


solid = Compound([part.part, body_2.part, body_3.part, body_4.part, body_5.part, body_6.part, body_7_1.part])
